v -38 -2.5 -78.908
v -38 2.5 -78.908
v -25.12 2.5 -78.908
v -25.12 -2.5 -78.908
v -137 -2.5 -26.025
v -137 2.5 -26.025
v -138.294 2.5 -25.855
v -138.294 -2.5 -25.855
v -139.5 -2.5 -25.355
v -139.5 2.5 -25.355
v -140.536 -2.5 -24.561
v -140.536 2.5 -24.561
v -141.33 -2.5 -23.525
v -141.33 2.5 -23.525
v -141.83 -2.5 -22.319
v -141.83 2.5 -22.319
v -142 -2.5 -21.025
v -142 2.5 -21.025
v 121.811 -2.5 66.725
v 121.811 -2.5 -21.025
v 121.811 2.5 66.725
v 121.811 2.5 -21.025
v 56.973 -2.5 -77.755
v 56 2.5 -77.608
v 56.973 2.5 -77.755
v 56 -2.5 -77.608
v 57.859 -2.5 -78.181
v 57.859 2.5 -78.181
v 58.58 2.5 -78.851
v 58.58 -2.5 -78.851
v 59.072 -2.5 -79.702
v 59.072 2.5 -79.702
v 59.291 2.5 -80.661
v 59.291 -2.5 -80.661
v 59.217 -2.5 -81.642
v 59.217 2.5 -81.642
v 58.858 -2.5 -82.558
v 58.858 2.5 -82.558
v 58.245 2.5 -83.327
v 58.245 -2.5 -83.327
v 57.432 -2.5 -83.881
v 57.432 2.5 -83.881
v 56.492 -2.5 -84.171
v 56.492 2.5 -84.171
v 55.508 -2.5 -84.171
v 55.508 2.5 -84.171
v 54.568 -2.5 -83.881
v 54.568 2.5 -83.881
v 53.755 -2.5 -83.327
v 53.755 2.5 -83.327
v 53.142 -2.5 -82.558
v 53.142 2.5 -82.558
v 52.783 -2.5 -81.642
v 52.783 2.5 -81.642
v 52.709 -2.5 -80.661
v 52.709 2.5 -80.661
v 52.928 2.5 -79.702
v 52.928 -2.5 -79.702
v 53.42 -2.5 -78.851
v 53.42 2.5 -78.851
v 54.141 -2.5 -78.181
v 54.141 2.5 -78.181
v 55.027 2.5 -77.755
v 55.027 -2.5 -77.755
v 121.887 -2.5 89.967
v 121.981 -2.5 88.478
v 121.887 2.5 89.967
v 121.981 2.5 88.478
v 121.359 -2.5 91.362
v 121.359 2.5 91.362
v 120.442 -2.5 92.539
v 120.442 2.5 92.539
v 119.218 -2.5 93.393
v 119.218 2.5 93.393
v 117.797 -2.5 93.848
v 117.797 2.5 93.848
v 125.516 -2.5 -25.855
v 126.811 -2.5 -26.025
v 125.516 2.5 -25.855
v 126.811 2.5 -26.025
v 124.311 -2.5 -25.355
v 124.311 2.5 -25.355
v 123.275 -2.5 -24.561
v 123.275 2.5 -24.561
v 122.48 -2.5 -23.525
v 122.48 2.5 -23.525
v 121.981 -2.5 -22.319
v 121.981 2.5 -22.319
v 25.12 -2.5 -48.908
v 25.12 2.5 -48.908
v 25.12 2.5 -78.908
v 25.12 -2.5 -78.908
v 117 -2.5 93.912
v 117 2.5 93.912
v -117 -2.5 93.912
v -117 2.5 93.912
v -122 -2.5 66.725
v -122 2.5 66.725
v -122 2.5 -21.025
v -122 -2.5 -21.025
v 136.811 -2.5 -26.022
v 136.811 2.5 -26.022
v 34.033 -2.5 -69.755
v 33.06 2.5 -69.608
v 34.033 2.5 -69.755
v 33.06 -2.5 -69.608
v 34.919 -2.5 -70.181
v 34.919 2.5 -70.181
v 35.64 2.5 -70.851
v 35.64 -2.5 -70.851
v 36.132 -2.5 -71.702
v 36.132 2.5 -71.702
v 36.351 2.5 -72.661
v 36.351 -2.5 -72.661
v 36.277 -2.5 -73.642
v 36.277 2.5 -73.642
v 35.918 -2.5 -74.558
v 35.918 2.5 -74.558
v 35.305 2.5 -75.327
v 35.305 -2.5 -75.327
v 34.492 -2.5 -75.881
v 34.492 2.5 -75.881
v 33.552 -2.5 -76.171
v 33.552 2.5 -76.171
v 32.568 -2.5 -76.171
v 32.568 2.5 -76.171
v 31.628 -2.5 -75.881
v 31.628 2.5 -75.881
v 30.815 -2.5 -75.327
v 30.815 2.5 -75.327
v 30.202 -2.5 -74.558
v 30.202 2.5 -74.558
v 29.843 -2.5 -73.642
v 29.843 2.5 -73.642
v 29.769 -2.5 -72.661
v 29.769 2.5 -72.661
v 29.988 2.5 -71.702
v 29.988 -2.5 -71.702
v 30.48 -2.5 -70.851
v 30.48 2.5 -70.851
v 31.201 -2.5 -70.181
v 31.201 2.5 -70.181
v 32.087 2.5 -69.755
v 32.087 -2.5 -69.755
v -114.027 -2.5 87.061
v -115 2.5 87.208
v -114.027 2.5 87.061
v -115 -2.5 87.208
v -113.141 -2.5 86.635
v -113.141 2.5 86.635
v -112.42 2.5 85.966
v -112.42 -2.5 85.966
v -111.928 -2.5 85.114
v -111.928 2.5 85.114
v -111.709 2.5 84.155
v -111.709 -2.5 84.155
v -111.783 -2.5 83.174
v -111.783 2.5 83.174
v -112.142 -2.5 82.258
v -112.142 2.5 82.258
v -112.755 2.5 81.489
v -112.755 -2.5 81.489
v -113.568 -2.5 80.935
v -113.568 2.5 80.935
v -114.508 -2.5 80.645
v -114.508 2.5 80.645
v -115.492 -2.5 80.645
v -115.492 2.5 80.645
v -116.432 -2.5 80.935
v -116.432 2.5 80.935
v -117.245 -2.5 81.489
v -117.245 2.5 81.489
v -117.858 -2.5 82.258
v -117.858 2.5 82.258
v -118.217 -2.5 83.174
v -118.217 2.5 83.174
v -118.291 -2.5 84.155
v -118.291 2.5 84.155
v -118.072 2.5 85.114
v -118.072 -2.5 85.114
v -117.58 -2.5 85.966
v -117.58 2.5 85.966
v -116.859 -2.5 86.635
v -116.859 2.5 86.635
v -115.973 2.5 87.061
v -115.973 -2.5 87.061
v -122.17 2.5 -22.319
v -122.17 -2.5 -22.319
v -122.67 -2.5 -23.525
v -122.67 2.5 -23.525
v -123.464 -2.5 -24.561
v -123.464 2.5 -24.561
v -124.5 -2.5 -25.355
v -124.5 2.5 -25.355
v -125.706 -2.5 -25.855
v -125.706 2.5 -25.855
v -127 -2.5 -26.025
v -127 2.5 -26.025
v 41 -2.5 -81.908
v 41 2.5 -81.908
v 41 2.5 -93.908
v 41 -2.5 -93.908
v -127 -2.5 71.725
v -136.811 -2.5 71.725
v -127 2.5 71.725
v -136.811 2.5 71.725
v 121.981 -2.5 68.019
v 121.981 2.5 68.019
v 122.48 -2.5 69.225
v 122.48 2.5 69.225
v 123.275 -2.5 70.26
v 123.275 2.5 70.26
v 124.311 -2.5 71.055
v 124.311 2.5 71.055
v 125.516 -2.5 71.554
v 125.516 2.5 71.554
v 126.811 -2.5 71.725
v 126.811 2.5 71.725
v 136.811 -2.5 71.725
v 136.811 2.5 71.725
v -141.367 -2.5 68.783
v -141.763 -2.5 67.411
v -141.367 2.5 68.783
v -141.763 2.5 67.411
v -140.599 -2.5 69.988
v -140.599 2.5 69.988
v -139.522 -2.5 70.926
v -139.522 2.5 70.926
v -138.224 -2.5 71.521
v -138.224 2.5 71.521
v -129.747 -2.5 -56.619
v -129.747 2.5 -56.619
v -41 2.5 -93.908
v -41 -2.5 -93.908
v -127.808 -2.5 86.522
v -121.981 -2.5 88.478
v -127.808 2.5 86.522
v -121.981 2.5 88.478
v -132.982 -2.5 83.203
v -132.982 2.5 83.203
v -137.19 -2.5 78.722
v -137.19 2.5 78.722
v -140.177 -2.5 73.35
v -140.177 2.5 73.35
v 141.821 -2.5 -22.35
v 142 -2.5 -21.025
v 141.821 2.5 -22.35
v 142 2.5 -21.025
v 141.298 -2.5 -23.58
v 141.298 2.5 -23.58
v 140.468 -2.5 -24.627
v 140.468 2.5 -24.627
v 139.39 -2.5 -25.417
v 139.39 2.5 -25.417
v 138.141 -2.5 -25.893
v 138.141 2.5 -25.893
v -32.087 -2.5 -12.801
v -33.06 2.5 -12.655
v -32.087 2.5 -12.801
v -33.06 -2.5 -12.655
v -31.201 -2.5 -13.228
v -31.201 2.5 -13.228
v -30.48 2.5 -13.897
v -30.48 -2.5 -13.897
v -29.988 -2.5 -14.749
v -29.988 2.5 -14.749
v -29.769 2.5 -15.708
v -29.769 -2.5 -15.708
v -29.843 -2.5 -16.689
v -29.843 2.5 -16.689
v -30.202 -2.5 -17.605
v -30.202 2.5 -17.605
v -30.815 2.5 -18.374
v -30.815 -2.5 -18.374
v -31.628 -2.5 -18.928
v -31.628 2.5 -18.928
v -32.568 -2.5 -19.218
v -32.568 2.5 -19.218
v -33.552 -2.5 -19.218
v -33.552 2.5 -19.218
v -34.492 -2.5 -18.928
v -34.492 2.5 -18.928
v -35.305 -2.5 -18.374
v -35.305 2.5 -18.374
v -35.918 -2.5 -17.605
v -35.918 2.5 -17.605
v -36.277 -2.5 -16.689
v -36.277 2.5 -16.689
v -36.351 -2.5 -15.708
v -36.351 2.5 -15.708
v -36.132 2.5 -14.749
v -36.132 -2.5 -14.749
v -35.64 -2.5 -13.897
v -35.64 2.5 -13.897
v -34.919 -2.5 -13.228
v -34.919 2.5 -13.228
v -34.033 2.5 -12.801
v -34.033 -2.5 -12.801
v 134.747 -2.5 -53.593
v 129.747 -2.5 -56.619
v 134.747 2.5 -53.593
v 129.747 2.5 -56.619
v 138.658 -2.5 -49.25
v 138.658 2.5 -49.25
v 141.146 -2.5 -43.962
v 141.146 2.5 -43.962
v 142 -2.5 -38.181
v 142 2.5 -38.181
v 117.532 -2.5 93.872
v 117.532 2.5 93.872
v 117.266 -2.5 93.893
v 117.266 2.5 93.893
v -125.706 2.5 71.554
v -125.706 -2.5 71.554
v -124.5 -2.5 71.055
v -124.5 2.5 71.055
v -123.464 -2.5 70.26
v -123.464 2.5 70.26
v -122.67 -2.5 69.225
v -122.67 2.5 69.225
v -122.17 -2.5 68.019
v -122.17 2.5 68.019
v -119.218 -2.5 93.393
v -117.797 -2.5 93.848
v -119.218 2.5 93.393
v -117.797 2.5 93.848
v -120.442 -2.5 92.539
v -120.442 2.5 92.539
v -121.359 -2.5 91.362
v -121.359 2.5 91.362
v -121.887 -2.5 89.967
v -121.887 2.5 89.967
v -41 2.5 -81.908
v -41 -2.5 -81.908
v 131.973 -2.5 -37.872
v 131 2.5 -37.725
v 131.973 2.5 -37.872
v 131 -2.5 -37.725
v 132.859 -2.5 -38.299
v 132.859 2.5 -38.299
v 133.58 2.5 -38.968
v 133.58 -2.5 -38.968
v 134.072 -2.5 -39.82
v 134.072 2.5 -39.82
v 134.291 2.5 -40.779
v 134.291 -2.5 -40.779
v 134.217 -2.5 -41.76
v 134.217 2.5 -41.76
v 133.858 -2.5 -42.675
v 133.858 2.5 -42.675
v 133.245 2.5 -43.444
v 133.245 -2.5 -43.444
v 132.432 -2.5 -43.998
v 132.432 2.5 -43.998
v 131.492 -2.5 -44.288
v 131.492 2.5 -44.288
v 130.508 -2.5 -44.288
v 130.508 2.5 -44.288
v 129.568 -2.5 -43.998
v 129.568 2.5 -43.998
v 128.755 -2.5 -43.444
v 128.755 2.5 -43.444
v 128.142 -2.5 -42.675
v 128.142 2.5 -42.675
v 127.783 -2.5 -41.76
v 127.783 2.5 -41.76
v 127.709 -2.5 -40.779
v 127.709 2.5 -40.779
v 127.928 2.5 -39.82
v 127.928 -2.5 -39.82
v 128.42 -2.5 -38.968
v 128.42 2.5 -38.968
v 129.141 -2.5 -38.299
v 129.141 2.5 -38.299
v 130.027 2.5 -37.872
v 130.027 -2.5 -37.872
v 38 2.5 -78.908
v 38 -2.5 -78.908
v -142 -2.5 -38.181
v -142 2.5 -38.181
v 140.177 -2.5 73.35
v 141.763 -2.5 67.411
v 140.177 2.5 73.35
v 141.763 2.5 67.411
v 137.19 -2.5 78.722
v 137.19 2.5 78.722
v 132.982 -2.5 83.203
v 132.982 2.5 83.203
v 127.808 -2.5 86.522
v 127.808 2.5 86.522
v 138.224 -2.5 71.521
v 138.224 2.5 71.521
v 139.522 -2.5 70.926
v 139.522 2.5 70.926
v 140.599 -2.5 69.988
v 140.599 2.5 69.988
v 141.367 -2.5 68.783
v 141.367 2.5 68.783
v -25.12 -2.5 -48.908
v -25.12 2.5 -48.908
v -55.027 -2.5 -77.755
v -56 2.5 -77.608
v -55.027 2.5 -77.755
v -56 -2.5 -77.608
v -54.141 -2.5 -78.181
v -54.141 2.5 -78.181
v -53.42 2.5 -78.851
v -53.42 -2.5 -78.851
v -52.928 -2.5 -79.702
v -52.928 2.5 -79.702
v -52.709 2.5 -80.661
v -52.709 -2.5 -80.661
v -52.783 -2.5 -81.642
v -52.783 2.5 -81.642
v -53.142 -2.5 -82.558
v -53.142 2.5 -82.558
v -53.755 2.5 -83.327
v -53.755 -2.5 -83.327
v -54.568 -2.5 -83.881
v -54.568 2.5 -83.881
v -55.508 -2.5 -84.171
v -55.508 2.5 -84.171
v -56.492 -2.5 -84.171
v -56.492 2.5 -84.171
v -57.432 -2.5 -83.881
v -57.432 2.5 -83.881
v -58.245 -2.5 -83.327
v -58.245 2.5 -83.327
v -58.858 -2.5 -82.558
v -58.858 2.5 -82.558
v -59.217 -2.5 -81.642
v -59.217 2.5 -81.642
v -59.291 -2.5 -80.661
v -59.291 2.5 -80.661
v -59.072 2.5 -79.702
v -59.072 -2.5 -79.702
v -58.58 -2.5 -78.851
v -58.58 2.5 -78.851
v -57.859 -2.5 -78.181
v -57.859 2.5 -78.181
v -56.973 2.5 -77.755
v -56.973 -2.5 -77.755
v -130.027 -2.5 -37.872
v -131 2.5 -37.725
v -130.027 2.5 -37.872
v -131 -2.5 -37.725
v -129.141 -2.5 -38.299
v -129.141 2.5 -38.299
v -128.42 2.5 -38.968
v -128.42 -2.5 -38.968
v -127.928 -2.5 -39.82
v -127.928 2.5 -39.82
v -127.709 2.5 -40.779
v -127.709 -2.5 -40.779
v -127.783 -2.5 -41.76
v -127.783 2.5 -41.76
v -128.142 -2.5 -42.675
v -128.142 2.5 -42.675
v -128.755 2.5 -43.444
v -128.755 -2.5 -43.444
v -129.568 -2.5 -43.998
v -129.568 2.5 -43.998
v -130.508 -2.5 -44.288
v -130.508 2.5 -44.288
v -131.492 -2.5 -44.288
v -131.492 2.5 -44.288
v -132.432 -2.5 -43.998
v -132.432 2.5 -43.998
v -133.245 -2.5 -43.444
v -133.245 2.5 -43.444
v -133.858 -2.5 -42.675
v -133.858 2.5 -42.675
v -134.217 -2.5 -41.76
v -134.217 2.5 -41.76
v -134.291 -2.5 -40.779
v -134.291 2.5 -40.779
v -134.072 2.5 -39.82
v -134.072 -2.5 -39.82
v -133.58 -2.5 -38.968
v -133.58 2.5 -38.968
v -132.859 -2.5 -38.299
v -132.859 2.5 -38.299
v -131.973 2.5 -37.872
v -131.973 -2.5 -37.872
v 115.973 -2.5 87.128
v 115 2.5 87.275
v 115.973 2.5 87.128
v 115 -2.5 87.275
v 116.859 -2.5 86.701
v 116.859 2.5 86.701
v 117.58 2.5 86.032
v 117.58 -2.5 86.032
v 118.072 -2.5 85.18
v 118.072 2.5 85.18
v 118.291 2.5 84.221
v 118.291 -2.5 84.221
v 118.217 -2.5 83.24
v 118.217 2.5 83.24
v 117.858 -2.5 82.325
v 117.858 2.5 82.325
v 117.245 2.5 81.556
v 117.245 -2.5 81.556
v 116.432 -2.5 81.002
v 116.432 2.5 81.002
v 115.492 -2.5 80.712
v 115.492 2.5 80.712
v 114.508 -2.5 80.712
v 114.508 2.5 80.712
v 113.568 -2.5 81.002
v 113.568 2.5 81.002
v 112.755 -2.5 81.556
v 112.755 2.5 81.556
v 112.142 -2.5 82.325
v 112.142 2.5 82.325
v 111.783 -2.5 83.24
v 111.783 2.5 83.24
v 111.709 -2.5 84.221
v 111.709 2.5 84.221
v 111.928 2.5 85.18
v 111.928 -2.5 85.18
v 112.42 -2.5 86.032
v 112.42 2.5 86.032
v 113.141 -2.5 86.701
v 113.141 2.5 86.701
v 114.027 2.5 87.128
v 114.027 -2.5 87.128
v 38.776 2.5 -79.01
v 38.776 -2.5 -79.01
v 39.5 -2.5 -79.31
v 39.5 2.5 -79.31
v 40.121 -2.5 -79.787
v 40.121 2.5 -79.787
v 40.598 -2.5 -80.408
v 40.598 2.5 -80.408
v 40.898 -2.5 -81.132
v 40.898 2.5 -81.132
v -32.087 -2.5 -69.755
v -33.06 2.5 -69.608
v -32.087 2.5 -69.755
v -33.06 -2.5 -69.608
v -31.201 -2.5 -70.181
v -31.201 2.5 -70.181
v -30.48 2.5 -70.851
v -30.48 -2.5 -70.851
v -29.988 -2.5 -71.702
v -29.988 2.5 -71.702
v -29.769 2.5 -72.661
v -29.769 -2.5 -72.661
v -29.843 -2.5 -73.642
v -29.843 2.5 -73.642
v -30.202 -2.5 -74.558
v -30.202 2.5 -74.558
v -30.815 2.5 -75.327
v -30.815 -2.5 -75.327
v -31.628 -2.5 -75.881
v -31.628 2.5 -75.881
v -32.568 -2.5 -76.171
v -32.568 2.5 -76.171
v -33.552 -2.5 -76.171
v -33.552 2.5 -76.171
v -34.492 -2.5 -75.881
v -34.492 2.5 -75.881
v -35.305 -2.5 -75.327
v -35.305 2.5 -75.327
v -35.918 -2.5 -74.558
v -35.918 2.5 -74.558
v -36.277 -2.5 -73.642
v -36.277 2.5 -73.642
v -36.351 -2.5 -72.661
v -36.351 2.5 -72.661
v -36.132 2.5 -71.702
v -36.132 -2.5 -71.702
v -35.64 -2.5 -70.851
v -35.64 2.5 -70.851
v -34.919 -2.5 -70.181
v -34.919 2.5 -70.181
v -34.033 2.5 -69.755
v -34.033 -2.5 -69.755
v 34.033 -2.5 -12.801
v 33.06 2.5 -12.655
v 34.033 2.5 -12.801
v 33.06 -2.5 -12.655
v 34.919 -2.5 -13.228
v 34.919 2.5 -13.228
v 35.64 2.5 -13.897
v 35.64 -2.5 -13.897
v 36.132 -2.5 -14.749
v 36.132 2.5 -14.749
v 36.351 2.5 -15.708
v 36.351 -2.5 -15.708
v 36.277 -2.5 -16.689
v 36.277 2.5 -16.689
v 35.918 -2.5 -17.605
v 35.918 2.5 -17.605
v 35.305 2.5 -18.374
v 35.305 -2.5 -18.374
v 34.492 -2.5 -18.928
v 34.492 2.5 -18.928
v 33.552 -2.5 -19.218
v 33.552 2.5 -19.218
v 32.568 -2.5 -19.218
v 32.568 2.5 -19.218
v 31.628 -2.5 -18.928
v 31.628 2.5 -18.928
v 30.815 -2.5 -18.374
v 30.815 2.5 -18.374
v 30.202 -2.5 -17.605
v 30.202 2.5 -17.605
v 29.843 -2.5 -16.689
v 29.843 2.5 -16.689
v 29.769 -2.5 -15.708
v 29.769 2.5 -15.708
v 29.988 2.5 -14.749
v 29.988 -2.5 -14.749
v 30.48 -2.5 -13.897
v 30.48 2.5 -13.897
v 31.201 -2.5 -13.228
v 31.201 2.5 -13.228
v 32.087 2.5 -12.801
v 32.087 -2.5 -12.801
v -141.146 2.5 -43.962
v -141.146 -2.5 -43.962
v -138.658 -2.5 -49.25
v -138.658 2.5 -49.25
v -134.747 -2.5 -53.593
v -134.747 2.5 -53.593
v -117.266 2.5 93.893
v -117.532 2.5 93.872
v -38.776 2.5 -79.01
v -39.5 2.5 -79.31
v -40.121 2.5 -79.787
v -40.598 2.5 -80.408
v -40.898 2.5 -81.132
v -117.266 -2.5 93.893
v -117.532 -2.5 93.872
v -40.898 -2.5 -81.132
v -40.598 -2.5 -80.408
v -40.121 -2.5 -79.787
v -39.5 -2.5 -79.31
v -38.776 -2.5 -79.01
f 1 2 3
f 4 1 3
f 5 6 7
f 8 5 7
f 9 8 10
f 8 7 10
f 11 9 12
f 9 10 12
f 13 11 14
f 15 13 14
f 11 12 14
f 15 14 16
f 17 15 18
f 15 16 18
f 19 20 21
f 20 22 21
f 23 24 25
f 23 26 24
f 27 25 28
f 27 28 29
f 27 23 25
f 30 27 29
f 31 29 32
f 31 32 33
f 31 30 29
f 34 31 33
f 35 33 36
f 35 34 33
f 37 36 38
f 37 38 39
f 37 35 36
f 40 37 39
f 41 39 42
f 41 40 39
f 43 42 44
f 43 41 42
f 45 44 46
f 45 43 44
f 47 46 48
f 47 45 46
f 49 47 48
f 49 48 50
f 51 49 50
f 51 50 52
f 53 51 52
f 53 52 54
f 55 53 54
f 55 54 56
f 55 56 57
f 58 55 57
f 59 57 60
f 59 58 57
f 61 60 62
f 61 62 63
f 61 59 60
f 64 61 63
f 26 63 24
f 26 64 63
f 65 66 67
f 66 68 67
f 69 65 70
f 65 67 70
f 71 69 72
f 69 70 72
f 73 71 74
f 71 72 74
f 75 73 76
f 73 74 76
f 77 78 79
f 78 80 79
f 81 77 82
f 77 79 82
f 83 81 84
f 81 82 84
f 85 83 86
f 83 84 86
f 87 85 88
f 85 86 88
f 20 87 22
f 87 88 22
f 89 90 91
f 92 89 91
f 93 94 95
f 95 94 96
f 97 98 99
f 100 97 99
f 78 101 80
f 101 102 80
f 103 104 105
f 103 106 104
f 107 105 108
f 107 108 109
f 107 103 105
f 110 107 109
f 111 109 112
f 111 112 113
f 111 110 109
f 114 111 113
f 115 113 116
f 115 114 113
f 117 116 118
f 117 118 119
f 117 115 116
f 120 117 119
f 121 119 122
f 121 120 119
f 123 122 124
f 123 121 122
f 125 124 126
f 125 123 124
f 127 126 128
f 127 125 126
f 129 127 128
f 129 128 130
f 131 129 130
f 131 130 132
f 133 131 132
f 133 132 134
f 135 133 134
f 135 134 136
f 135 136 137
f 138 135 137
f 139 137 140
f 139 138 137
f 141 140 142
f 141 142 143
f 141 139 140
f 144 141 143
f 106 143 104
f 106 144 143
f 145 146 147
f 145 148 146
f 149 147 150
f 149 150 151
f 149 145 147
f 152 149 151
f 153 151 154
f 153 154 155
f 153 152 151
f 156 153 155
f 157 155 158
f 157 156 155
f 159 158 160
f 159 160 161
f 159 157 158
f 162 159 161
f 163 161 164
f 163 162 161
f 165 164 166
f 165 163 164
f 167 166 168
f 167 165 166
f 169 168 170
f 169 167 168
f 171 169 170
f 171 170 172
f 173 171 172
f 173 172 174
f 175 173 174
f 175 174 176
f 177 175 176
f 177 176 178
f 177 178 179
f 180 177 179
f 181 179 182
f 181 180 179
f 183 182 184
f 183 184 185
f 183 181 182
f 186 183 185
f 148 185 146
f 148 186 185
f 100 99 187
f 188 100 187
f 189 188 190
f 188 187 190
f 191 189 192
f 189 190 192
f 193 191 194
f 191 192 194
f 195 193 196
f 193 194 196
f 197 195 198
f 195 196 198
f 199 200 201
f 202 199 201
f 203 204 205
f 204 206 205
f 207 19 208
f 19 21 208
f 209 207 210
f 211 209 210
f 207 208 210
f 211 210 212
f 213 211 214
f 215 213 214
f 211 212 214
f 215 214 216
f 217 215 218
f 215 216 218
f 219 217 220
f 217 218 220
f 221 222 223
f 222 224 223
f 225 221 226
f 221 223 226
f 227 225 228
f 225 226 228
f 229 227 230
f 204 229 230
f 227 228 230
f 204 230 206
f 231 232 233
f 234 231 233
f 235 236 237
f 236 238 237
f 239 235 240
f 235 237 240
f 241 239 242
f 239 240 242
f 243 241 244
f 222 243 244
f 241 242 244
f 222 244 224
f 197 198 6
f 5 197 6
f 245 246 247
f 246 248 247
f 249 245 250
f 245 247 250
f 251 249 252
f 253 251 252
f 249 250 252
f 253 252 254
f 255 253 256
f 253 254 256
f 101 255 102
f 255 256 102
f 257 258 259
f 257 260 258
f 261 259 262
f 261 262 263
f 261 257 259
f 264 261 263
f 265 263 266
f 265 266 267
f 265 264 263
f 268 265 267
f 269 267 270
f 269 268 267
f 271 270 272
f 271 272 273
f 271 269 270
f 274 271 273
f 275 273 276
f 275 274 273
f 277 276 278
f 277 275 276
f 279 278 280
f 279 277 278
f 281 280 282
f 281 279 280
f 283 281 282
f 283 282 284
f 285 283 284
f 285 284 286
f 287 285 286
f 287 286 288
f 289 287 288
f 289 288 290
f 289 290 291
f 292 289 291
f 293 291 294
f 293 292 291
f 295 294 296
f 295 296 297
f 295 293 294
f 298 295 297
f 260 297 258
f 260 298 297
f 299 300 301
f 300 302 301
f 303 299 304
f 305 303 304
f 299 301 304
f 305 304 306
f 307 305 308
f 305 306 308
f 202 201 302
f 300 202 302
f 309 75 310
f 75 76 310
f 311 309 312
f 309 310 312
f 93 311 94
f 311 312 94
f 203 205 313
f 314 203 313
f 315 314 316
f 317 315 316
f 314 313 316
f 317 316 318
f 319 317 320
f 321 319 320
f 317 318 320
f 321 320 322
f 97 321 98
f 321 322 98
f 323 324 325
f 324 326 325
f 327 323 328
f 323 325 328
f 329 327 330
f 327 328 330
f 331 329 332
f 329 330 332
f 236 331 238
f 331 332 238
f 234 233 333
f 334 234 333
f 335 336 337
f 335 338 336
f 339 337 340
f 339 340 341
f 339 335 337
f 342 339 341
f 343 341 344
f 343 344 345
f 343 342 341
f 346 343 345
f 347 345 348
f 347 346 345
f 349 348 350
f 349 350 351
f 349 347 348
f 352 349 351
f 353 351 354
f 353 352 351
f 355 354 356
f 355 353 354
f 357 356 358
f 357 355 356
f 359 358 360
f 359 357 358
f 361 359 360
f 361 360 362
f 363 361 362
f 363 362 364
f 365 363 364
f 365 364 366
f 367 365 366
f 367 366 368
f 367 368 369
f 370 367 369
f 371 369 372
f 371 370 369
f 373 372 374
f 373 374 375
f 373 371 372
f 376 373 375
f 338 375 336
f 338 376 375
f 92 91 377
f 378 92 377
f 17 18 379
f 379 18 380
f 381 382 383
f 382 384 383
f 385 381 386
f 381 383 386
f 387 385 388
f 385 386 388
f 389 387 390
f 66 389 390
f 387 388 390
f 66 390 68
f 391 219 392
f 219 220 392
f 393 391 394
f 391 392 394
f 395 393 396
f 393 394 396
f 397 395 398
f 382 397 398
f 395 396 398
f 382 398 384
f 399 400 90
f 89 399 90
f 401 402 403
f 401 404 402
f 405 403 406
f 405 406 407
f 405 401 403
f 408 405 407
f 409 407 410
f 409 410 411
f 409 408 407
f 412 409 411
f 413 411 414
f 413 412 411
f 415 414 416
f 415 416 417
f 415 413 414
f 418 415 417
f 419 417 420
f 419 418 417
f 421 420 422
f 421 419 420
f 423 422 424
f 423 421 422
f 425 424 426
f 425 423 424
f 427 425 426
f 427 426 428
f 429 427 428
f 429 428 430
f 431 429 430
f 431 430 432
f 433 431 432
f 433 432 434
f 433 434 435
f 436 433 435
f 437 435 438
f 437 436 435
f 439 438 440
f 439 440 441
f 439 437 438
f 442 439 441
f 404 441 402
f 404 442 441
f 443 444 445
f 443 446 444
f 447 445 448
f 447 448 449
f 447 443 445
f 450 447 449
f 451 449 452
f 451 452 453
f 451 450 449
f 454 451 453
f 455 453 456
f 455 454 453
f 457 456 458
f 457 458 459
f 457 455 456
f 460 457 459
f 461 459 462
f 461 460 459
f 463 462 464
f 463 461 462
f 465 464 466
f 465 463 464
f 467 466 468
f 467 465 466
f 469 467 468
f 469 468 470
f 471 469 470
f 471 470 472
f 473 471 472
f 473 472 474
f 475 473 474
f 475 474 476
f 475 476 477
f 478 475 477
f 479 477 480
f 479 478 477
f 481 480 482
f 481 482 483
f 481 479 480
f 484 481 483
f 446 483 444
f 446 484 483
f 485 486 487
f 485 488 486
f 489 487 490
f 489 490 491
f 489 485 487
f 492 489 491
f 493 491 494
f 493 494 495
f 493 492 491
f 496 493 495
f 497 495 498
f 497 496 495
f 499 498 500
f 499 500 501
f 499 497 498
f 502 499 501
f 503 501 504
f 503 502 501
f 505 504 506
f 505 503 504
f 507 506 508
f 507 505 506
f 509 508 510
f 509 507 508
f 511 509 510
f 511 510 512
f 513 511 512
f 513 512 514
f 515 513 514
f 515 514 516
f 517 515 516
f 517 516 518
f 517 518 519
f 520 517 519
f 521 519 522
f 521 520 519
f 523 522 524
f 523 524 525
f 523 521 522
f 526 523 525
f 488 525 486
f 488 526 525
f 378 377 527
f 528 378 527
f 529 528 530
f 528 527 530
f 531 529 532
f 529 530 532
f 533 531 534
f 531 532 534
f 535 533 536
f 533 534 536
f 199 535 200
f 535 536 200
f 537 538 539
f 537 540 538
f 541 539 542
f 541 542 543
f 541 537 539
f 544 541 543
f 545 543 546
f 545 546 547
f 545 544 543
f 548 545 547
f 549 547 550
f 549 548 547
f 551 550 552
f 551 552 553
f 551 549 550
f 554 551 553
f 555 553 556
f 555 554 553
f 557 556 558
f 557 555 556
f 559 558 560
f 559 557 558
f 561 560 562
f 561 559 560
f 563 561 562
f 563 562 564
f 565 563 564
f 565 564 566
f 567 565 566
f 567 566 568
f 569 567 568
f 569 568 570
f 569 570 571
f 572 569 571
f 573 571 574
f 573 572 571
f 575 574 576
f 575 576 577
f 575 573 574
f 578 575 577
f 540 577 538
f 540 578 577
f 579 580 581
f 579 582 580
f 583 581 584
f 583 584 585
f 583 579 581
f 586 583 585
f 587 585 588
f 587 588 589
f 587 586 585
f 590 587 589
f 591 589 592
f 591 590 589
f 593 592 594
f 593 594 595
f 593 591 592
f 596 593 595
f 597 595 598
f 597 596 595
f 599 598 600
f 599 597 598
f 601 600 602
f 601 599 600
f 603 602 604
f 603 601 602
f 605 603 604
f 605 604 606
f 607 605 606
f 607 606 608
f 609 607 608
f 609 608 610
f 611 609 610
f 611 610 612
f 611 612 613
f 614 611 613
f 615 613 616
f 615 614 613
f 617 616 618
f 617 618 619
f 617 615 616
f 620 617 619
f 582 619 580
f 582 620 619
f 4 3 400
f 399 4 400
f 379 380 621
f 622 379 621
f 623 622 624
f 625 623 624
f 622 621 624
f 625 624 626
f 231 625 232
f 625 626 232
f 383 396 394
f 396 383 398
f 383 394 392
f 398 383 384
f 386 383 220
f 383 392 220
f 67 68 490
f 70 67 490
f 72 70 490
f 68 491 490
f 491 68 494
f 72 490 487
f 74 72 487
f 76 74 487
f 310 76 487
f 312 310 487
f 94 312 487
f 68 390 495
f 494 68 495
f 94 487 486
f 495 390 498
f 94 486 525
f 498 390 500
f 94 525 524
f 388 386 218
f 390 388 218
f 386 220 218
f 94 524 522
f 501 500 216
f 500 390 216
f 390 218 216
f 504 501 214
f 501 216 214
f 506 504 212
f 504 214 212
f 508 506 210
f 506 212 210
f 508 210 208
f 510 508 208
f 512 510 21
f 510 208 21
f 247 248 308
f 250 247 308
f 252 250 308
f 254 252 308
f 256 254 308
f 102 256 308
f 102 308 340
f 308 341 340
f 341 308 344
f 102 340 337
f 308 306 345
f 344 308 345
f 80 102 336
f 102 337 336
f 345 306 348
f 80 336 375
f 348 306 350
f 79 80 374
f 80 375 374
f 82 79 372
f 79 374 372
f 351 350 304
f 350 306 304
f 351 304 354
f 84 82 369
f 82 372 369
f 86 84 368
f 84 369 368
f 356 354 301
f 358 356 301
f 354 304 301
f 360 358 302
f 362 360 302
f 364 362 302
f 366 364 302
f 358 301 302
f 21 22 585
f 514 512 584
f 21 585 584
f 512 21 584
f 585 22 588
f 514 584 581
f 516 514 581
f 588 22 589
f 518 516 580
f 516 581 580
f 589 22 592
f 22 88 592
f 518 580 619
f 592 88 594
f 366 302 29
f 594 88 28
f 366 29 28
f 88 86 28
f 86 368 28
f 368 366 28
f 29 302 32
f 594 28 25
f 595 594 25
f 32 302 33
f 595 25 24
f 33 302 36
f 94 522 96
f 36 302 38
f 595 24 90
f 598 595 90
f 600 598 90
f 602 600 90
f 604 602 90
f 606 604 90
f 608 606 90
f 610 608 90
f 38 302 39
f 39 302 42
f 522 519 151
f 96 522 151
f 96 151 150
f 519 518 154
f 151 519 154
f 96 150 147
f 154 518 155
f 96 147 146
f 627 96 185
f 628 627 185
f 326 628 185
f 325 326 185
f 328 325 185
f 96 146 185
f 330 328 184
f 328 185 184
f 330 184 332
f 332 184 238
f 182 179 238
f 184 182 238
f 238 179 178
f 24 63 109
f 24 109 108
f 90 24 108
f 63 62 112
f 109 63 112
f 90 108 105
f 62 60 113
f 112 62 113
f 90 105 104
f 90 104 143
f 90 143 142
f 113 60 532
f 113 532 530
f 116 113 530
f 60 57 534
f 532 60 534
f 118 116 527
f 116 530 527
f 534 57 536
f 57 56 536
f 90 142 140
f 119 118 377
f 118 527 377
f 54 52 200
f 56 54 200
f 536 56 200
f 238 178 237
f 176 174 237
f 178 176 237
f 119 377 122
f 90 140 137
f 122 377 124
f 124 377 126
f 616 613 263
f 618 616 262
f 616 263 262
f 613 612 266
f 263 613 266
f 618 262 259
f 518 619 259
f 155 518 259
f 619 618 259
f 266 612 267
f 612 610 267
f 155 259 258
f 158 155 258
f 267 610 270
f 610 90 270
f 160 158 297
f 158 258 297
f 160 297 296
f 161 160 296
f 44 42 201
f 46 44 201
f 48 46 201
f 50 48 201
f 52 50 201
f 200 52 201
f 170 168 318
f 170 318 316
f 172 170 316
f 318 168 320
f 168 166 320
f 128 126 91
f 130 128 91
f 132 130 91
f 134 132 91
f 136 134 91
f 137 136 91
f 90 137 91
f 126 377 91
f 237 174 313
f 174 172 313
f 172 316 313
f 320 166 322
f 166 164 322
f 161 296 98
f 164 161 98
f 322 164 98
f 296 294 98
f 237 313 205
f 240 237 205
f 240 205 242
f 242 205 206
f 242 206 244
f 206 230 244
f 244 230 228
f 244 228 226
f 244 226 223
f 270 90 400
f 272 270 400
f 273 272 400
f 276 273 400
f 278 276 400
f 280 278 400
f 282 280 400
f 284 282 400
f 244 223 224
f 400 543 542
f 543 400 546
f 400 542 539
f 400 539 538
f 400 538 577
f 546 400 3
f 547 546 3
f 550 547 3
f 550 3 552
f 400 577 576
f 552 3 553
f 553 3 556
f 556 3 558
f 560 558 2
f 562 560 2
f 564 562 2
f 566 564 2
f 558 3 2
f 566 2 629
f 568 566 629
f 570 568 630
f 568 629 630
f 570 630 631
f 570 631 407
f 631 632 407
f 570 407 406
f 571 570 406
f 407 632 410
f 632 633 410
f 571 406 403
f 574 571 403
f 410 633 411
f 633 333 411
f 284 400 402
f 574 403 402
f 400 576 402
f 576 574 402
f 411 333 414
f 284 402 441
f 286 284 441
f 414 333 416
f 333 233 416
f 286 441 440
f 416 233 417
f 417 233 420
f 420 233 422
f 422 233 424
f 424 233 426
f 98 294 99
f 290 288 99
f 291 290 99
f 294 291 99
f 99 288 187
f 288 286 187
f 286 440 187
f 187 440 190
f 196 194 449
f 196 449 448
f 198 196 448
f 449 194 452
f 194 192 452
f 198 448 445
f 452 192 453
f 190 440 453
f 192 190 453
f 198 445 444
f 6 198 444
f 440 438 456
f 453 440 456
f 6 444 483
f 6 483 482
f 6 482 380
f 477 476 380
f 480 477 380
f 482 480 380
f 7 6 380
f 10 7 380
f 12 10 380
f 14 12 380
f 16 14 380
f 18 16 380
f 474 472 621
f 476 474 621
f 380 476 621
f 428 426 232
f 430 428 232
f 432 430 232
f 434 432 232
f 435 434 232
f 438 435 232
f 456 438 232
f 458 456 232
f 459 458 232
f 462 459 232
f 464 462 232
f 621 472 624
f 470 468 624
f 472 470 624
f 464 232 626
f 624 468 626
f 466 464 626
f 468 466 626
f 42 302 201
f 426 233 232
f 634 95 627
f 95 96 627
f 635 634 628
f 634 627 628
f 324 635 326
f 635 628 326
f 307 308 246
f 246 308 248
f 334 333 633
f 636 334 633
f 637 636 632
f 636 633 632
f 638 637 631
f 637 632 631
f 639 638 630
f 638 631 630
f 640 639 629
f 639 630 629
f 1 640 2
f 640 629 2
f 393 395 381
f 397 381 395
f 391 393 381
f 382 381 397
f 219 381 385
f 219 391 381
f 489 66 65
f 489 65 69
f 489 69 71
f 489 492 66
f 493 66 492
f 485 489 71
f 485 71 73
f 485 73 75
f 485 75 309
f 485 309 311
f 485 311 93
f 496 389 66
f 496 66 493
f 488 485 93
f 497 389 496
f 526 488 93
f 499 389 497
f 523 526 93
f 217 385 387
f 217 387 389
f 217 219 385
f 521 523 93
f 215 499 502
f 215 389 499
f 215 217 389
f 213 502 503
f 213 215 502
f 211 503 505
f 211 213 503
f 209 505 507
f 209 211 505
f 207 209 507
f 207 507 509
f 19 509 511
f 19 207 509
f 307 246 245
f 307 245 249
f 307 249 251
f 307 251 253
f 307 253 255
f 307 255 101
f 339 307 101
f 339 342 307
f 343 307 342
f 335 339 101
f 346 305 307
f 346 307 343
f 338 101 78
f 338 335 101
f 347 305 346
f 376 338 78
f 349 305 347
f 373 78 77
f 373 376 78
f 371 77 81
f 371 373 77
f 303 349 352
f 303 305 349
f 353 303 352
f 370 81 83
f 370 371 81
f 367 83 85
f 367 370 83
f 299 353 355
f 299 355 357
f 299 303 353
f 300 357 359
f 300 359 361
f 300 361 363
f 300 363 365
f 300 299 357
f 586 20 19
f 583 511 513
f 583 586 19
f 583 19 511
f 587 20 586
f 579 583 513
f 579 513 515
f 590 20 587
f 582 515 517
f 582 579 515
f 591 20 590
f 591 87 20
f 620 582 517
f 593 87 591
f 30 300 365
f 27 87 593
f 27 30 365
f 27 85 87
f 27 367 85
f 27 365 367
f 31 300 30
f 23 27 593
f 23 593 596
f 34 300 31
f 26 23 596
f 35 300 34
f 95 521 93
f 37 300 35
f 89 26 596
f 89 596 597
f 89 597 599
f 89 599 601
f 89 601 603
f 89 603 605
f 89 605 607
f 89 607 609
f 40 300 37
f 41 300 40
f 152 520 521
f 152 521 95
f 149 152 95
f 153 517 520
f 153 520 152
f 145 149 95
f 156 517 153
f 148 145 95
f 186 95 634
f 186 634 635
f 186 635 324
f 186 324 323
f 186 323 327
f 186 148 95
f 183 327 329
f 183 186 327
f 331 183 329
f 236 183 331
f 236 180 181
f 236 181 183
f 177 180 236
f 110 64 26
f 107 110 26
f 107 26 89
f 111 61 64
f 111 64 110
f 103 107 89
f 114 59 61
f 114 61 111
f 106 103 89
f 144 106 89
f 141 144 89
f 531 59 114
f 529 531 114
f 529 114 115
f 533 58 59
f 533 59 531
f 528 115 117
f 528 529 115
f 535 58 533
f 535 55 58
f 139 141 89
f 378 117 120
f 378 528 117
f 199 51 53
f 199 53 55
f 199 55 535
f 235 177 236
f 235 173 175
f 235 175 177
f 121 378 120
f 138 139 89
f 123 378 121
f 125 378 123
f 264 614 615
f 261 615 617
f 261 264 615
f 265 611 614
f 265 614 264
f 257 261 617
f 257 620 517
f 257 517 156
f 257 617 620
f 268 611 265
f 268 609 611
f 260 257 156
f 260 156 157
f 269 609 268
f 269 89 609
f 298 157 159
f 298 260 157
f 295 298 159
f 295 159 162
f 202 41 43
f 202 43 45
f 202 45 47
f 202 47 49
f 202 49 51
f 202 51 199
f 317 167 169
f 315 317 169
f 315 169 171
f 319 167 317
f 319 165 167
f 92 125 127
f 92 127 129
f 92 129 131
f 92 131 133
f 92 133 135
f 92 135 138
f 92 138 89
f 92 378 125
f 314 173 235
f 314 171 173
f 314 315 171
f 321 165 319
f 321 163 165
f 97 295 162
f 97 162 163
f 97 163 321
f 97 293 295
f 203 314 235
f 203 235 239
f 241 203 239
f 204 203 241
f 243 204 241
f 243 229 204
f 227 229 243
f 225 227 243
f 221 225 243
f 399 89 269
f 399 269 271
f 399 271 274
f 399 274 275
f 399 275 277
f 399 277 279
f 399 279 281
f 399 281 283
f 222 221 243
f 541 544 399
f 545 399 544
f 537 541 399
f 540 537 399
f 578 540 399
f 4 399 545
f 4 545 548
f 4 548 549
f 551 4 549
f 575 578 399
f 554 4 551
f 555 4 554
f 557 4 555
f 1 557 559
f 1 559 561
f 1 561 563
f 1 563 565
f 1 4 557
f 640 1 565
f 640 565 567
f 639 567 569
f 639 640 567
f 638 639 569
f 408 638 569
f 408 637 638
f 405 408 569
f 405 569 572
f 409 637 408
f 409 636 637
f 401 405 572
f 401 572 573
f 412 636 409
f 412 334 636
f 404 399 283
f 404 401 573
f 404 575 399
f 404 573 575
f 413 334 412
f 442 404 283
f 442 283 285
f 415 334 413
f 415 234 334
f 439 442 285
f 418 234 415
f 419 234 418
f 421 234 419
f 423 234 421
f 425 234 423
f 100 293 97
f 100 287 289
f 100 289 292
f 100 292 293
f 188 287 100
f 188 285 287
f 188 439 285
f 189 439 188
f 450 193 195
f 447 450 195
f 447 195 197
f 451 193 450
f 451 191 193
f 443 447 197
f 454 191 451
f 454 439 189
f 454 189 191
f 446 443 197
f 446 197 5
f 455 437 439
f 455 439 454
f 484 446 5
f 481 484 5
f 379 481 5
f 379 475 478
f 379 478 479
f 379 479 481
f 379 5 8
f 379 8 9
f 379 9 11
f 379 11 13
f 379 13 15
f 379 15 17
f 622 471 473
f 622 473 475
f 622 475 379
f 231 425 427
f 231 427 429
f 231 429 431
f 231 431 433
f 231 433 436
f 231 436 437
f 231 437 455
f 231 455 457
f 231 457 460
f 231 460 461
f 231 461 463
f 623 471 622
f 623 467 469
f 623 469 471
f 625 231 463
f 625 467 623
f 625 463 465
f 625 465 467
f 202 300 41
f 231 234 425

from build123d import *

# Parameters (mm, degrees)
SKETCH2_R                = 3.3
RESSALTO_EXTRUS_O3_DEPTH = 2.5


with BuildPart() as part:
    # Sketch2 → Ressalto-extrusão3 (new, symmetric)
    with BuildSketch(Plane(origin=(0, 0, 0), x_dir=(1, 0, 0), z_dir=(0, 1, 0))):
        with BuildLine():
            Line((41, 93.908069032), (129.747283843, 56.619294308))
            ThreePointArc((129.747283843, 56.619294308), (138.657515974, 49.24995754), (142, 38.180758763))
            Line((142, 38.180758763), (142, 21.025190062))
            ThreePointArc((142, 21.025190062), (140.46792235, 24.627066597), (136.810594171, 26.021601317))
            Line((136.810594171, 26.021601317), (126.810594815, 26.025190062))
            ThreePointArc((126.810594815, 26.025190062), (123.275060909, 24.560723968), (121.810594815, 21.025190062))
            Line((121.810594815, 21.025190062), (121.810594815, -66.724809938))
            ThreePointArc((121.810594815, -66.724809938), (123.275060909, -70.260343844), (126.810594815, -71.724809938))
            Line((126.810594815, -71.724809938), (136.810594815, -71.724809938))
            ThreePointArc((136.810594815, -71.724809938), (140.09446004, -70.495251448), (141.763243519, -67.411301611))
            ThreePointArc((141.763243519, -67.411301611), (135.224391149, -81.092334042), (121.981084486, -88.47759418))
            ThreePointArc((121.981084486, -88.47759418), (120.944283966, -91.984987628), (117.797013197, -93.84817061))
            ThreePointArc((117.797013197, -93.84817061), (117.3987196, -93.882791886), (117, -93.91210234))
            Line((117, -93.91210234), (-117, -93.91210234))
            ThreePointArc((-117, -93.91210234), (-117.3987196, -93.882791886), (-117.797013197, -93.84817061))
            ThreePointArc((-117.797013197, -93.84817061), (-120.944283966, -91.984987628), (-121.981084486, -88.47759418))
            ThreePointArc((-121.981084486, -88.47759418), (-135.224391149, -81.092334042), (-141.763243519, -67.411301611))
            ThreePointArc((-141.763243519, -67.411301611), (-140.09446004, -70.495251448), (-136.810594815, -71.724809938))
            Line((-136.810594815, -71.724809938), (-127, -71.724809938))
            ThreePointArc((-127, -71.724809938), (-123.464466094, -70.260343844), (-122, -66.724809938))
            Line((-122, -66.724809938), (-122, 21.025190062))
            ThreePointArc((-122, 21.025190062), (-123.464466094, 24.560723968), (-127, 26.025190062))
            Line((-127, 26.025190062), (-137, 26.025190062))
            ThreePointArc((-137, 26.025190062), (-140.535533906, 24.560723968), (-142, 21.025190062))
            Line((-142, 21.025190062), (-142, 38.180758763))
            ThreePointArc((-142, 38.180758763), (-138.657515974, 49.24995754), (-129.747283843, 56.619294308))
            Line((-129.747283843, 56.619294308), (-41, 93.908069032))
            Line((-41, 93.908069032), (-41, 81.908069032))
            ThreePointArc((-41, 81.908069032), (-40.121320344, 79.786748689), (-38, 78.908069032))
            Line((-38, 78.908069032), (-25.12, 78.908069032))
            Line((-25.12, 78.908069032), (-25.12, 48.908069032))
            Line((-25.12, 48.908069032), (25.12, 48.908069032))
            Line((25.12, 48.908069032), (25.12, 78.908069032))
            Line((25.12, 78.908069032), (38, 78.908069032))
            ThreePointArc((38, 78.908069032), (40.121320344, 79.786748689), (41, 81.908069032))
            Line((41, 81.908069032), (41, 93.908069032))
        make_face()
        with Locations(Location((-33.06, 15.954790167, 0), (0, 0, 270))):
            Circle(SKETCH2_R, mode=Mode.SUBTRACT)
        with Locations(Location((33.06, 15.954790032, 0), (0, 0, 270))):
            Circle(SKETCH2_R, mode=Mode.SUBTRACT)
        with Locations(Location((33.06, 72.908069032, 0), (0, 0, 270))):
            Circle(SKETCH2_R, mode=Mode.SUBTRACT)
        with Locations(Location((-33.06, 72.908069032, 0), (0, 0, 270))):
            Circle(SKETCH2_R, mode=Mode.SUBTRACT)
        with Locations(Location((-56, 80.908069032, 0), (0, 0, 270))):
            Circle(SKETCH2_R, mode=Mode.SUBTRACT)
        with Locations(Location((-131, 41.025190062, 0), (0, 0, 270))):
            Circle(SKETCH2_R, mode=Mode.SUBTRACT)
        with Locations(Location((56, 80.908069032, 0), (0, 0, 270))):
            Circle(SKETCH2_R, mode=Mode.SUBTRACT)
        with Locations(Location((131, 41.025190062, 0), (0, 0, 270))):
            Circle(SKETCH2_R, mode=Mode.SUBTRACT)
        with Locations(Location((115, -83.974809938, 0), (0, 0, 270))):
            Circle(SKETCH2_R, mode=Mode.SUBTRACT)
        with Locations(Location((-115, -83.908069032, 0), (0, 0, 270))):
            Circle(SKETCH2_R, mode=Mode.SUBTRACT)
    extrude(amount=RESSALTO_EXTRUS_O3_DEPTH, both=True)


solid = part.part
